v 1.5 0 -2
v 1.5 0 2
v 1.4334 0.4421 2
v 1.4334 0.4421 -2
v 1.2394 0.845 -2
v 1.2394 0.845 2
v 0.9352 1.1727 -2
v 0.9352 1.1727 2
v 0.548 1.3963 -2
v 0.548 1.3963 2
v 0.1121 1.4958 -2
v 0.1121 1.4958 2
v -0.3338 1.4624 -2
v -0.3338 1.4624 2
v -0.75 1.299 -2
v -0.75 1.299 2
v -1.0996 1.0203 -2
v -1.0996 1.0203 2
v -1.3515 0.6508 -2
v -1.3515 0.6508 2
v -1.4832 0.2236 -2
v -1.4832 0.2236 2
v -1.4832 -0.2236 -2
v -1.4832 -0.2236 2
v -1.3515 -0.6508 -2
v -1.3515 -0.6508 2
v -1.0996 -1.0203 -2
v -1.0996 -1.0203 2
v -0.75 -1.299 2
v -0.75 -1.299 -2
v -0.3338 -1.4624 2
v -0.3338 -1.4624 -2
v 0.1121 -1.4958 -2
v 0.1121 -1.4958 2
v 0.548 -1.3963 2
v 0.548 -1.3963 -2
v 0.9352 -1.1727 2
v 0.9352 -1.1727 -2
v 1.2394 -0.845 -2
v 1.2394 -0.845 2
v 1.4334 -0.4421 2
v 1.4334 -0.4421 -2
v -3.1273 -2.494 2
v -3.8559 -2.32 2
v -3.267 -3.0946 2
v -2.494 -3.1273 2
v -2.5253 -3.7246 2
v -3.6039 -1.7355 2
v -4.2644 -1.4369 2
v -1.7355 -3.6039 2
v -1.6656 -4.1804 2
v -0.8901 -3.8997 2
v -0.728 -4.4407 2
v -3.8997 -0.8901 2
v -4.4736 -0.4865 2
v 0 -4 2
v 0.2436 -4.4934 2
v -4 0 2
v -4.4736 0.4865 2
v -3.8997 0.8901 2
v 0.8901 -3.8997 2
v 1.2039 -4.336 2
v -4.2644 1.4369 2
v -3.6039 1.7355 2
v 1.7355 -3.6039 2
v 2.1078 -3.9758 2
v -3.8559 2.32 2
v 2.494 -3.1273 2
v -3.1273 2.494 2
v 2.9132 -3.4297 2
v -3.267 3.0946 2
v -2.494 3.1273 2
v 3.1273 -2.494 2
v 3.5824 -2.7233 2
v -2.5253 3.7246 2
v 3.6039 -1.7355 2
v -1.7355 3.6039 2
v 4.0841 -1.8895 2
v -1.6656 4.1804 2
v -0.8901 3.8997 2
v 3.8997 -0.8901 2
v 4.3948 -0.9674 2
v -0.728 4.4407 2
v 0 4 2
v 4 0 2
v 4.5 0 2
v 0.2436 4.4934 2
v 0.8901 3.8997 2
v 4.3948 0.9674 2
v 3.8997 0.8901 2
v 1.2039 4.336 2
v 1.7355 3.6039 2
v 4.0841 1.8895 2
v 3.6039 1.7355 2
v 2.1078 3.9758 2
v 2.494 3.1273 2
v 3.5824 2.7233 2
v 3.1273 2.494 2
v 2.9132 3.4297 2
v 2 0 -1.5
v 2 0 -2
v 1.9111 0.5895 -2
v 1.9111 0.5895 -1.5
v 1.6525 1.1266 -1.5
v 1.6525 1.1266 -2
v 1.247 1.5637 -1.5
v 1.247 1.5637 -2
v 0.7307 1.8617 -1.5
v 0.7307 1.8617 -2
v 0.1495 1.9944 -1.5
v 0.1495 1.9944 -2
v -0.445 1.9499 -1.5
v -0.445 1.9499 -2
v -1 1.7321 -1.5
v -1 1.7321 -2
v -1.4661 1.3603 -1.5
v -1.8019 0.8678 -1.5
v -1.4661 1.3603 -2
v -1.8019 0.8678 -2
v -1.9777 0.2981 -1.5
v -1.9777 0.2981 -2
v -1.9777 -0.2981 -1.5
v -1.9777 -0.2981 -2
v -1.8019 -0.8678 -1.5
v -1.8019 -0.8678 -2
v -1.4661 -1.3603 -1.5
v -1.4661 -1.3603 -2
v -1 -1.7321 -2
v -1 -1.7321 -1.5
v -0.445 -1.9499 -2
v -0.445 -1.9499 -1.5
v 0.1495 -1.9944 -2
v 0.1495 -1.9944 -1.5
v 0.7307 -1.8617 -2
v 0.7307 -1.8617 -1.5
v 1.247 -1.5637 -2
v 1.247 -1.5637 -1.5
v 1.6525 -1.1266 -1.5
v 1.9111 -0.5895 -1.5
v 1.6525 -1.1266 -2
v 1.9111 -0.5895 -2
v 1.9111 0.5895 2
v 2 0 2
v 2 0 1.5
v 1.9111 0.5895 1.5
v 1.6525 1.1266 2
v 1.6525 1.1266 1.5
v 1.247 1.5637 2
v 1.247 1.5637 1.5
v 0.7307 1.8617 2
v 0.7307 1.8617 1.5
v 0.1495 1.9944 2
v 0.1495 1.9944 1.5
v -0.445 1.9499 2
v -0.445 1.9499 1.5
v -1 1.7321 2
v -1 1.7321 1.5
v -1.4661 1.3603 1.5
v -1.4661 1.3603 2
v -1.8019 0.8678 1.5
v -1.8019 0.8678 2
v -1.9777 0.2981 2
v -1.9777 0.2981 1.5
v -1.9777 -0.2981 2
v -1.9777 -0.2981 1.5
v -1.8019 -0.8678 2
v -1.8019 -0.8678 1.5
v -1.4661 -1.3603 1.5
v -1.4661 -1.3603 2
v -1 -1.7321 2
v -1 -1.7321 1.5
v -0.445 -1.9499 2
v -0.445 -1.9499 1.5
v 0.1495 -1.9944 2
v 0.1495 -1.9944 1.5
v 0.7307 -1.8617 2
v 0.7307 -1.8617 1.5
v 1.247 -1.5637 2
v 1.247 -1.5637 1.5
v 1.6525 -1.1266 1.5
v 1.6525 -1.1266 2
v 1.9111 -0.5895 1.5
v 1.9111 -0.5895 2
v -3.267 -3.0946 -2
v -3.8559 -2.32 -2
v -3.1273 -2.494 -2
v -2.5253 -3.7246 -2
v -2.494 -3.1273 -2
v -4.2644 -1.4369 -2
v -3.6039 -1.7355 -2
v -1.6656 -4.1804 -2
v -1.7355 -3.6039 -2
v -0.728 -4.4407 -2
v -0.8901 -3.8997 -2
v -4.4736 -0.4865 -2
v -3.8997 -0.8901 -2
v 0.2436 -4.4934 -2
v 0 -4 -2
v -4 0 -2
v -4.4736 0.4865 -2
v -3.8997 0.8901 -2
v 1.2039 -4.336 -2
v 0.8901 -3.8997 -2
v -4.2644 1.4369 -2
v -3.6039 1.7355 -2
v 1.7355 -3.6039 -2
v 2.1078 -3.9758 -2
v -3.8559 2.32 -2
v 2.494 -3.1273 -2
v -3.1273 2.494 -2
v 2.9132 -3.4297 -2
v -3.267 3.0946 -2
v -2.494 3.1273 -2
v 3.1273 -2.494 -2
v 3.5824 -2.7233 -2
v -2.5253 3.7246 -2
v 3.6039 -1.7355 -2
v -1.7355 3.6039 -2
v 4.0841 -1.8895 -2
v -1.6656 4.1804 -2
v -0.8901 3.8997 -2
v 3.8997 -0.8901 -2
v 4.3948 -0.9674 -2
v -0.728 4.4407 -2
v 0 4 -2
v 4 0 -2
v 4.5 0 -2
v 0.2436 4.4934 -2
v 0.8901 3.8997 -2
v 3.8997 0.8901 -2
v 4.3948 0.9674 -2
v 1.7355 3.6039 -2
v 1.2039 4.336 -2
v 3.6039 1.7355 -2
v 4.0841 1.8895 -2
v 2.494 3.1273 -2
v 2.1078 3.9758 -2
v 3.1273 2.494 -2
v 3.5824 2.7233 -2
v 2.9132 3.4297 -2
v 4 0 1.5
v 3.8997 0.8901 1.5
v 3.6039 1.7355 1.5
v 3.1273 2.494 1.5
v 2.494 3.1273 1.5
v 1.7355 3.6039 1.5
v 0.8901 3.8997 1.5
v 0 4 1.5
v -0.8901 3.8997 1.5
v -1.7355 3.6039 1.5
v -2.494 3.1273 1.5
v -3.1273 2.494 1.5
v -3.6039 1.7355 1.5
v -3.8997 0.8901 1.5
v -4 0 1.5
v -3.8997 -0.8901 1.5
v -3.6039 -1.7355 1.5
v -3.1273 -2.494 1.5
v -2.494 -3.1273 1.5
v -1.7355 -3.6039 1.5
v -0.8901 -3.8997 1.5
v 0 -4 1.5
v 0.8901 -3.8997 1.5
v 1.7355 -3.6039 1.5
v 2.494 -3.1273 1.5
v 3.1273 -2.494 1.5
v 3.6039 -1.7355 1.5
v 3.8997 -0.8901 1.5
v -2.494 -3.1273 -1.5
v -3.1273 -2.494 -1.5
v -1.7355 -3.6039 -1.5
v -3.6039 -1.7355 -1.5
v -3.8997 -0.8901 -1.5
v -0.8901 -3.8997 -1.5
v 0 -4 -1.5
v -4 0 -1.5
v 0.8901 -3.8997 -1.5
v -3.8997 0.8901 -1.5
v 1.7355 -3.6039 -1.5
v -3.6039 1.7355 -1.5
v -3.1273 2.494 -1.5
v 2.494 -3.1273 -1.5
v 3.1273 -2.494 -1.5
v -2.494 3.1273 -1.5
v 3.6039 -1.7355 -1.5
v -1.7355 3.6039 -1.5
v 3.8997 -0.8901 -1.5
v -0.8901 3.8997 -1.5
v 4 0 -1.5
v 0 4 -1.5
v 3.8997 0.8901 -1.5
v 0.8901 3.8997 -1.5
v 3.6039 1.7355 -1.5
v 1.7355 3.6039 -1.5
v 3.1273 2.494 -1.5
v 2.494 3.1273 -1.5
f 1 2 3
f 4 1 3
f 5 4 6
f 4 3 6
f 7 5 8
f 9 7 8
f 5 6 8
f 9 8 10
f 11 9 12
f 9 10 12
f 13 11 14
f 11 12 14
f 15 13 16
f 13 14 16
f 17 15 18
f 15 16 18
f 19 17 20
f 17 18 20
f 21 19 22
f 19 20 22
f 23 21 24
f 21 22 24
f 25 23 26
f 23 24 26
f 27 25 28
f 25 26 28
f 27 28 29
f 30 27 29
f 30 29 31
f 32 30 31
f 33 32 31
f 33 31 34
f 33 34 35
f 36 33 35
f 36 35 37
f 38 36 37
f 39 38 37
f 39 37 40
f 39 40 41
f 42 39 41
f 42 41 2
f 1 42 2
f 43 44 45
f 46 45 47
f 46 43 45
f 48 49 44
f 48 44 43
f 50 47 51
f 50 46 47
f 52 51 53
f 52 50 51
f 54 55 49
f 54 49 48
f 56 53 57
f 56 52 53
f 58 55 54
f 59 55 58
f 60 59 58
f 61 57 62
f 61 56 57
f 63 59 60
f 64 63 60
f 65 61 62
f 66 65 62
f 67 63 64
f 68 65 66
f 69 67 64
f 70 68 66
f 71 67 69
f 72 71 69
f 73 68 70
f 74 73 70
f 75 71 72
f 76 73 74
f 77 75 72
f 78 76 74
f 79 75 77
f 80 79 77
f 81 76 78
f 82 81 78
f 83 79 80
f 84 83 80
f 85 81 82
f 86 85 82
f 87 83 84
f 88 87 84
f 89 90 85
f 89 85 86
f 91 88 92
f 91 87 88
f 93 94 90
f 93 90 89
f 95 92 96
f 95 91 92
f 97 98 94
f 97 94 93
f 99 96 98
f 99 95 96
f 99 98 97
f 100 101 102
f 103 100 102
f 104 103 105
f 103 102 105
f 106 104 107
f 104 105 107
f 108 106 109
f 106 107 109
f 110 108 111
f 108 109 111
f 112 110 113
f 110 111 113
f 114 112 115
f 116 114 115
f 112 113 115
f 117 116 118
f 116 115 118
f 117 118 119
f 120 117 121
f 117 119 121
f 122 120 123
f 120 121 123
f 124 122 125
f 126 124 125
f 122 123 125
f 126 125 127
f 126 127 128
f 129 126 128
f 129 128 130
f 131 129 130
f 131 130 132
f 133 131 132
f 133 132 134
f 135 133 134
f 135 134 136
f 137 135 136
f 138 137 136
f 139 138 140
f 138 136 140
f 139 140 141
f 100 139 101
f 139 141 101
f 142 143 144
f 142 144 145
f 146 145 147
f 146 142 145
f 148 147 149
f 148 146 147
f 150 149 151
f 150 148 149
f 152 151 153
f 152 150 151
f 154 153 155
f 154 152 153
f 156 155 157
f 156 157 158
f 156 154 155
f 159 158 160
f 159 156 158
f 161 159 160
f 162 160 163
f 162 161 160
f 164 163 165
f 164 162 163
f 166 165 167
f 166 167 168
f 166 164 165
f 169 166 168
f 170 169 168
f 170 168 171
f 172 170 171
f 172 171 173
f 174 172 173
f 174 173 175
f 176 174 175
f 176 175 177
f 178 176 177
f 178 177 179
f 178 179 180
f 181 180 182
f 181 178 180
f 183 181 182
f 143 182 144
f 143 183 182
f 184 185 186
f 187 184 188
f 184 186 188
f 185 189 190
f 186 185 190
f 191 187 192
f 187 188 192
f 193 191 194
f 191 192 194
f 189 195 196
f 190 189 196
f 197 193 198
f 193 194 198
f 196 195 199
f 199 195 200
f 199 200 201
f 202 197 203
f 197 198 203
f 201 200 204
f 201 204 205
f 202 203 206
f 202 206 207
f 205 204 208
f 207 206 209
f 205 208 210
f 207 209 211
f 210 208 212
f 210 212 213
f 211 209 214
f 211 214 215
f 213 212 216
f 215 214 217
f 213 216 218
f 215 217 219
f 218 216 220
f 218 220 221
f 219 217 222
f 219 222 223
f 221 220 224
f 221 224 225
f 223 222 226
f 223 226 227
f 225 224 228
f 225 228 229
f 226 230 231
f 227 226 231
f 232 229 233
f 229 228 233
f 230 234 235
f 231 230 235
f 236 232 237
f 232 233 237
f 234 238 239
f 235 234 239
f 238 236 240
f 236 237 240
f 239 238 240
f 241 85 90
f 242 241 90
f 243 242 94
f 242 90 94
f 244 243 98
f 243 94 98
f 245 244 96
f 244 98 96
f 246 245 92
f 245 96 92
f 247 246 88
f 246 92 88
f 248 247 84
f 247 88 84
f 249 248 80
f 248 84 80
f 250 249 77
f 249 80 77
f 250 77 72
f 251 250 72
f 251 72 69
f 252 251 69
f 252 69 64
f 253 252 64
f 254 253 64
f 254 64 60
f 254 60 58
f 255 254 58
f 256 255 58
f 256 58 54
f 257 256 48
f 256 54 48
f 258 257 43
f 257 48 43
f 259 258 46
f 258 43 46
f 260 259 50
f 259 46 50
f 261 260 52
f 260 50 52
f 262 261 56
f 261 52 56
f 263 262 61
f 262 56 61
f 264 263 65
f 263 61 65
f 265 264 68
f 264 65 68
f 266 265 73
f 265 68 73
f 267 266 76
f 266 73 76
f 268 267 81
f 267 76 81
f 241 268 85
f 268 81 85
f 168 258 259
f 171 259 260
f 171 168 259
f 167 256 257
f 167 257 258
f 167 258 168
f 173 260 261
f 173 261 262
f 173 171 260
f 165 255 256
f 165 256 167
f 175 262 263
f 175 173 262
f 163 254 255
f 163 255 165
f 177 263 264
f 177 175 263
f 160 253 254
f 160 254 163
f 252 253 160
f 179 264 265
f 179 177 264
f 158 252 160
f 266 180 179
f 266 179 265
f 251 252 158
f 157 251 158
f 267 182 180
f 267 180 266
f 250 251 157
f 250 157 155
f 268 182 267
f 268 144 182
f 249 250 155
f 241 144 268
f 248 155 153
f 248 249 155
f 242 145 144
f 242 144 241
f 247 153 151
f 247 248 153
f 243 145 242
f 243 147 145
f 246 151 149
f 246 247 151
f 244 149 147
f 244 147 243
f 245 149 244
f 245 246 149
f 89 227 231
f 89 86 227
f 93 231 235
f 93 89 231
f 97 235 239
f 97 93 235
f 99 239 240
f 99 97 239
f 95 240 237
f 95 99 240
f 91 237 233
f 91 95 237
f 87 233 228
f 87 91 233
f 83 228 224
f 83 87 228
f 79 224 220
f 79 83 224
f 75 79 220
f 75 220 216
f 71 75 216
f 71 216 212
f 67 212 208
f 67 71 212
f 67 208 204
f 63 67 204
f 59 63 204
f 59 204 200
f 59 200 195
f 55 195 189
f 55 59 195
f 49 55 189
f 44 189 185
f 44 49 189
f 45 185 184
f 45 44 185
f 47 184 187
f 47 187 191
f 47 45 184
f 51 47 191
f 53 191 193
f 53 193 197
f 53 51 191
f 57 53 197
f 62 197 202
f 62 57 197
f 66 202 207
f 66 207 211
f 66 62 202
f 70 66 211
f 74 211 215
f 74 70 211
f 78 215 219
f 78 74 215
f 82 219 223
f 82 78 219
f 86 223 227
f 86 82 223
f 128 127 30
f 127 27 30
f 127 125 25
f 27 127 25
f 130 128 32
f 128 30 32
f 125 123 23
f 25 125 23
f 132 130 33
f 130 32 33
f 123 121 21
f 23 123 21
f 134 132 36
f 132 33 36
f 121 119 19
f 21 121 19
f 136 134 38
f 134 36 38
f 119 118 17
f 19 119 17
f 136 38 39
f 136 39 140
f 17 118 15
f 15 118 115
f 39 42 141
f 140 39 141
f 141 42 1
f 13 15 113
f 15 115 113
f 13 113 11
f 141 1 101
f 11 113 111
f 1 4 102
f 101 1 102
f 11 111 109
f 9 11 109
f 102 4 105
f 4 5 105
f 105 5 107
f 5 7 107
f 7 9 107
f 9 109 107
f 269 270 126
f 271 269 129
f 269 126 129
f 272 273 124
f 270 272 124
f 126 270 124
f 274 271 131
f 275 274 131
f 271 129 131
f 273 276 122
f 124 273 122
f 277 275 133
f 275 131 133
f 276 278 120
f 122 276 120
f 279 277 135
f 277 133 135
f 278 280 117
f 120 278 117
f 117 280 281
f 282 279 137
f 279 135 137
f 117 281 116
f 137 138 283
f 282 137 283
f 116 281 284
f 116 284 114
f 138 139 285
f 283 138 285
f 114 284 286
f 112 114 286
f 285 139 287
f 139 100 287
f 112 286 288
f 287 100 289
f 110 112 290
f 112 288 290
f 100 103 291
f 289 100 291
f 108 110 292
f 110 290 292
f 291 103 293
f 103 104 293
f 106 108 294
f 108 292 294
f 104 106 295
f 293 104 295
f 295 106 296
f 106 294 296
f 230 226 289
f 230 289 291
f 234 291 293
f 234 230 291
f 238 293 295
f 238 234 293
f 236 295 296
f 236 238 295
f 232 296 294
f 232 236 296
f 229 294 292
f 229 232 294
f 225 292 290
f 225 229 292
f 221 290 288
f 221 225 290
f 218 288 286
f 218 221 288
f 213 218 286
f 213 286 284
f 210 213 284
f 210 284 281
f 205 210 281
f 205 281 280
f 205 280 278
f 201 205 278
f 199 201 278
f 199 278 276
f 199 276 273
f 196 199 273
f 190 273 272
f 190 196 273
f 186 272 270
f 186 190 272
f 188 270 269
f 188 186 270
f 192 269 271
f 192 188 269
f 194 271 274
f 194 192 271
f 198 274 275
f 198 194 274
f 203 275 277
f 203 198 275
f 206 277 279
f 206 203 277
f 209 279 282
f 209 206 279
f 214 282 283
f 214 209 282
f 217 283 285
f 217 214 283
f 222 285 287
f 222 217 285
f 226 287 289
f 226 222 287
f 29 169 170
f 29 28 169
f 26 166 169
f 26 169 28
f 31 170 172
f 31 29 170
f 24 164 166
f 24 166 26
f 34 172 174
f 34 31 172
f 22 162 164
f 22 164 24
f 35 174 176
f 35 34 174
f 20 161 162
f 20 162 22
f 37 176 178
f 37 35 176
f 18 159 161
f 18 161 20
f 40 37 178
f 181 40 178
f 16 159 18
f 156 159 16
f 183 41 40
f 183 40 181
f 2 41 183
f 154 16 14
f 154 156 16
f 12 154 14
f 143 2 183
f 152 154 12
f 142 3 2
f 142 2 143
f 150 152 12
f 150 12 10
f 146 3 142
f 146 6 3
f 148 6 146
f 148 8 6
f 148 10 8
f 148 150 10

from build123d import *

# Parameters (mm, degrees)
SKETCH_1_R          = 4.5
EXTRUDE_1_DEPTH     = 2
SKETCH_2_R          = 1.5
CUT_EXTRUDE_1_DEPTH = 5
SKETCH_3_R          = 4
SKETCH_3_R_2        = 2
CUT_EXTRUDE_2_DEPTH = 0.5


with BuildPart() as part:
    # 草圖1 → 填料-伸長1 (new body, symmetric)
    with BuildSketch(Plane.XY):
        Circle(SKETCH_1_R)
    extrude(amount=EXTRUDE_1_DEPTH, both=True)

    # 草圖2 → 除料-伸長1 (cut, through all)
    with BuildSketch(Plane.XY.offset(2)):
        Circle(SKETCH_2_R)
    extrude(amount=-CUT_EXTRUDE_1_DEPTH, mode=Mode.SUBTRACT)

    # 草圖3 → 除料-伸長2 (cut)
    with BuildSketch(Plane.XY.offset(2)):
        Circle(SKETCH_3_R)
        Circle(SKETCH_3_R_2, mode=Mode.SUBTRACT)
    cut_extrude_2 = extrude(amount=-CUT_EXTRUDE_2_DEPTH, mode=Mode.SUBTRACT)

    # 鏡射1: 除料-伸長2 across plane
    add(cut_extrude_2.mirror(Plane.XY), mode=Mode.SUBTRACT)


solid = part.part
